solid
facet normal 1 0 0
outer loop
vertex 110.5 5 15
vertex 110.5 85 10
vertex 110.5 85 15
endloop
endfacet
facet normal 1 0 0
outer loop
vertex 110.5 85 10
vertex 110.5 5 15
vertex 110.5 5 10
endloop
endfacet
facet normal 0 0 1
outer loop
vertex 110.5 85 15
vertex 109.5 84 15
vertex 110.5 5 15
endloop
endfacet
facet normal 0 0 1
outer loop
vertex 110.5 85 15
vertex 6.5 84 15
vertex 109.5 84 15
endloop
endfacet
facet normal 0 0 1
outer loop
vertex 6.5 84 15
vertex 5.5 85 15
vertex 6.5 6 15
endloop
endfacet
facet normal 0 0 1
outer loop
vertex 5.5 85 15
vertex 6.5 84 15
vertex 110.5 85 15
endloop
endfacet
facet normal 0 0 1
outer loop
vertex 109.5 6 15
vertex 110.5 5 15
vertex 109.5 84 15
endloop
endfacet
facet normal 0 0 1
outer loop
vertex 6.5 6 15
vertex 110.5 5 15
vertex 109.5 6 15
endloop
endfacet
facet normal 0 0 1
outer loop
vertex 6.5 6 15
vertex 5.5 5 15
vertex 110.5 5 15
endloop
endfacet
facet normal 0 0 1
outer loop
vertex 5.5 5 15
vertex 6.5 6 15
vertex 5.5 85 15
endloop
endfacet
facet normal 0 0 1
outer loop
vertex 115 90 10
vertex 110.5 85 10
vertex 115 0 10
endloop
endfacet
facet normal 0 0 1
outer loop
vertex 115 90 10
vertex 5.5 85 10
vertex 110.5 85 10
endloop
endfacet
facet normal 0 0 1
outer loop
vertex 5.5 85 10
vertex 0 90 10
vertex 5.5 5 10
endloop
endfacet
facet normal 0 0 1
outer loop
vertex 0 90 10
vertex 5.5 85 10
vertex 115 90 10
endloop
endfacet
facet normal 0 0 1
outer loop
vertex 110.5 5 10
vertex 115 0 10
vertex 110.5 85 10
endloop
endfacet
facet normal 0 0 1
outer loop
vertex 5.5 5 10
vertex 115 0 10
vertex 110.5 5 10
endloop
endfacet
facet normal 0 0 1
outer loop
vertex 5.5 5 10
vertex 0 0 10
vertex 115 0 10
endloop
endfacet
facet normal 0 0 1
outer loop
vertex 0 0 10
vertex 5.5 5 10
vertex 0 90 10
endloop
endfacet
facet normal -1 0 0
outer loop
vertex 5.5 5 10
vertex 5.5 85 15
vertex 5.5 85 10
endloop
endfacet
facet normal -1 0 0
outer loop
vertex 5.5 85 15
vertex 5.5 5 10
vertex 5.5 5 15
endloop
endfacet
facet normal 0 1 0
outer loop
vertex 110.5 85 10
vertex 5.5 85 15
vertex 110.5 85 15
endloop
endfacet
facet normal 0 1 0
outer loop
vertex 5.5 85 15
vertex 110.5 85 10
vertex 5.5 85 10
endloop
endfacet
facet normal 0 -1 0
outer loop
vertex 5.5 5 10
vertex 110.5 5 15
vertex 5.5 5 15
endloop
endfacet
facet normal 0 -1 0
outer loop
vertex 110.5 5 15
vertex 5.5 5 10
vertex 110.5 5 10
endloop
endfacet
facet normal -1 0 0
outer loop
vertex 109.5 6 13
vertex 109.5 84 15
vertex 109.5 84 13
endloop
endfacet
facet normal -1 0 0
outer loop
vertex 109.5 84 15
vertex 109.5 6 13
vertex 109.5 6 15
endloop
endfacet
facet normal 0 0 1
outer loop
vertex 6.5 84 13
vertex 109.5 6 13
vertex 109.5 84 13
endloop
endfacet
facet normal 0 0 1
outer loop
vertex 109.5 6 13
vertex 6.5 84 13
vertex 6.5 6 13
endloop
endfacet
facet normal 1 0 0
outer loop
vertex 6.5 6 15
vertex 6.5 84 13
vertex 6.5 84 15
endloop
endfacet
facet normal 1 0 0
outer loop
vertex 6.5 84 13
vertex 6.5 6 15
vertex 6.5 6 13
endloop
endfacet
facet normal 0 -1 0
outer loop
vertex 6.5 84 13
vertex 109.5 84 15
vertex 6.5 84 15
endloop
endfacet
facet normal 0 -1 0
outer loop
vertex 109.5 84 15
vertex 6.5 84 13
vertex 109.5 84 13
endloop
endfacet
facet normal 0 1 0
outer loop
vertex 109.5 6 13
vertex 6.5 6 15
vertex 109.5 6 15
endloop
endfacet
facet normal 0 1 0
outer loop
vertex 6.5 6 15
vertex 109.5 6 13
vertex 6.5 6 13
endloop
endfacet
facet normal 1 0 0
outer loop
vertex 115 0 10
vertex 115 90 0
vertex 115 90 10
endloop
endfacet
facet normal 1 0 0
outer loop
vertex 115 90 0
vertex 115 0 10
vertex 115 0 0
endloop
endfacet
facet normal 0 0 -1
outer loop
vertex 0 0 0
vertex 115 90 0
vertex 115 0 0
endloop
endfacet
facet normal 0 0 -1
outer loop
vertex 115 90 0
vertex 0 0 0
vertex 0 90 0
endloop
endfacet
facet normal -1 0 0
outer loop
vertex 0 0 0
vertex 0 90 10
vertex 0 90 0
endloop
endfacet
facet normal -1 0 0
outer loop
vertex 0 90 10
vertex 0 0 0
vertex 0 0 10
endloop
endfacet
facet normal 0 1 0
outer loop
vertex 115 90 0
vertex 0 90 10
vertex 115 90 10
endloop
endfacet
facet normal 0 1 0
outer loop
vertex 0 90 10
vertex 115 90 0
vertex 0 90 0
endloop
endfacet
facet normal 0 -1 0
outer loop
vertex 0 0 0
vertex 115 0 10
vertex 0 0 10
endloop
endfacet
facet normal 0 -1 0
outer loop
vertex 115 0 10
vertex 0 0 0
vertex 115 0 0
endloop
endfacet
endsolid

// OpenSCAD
/*
 * Generic platform
 * Simply change the values for the base and the platform 
 * to mount the microcontroller should auto fit on top
*/

$fn=100;
base = [110 + 5, 85 + 5, 10]; // udoo
// base = [ 68.7 + 5, 53.3 + 5, 10 ]; // arduino uno
// base = [ 101.6 + 5, 53.3 + 5, 10 ]; // arduino mega/due

platform = [ base[0]-10, base[1]-10, base[2]-5];
platform_bed = [ platform[0]-2, platform[1]-2, platform[2]-3 ];
 
union() {
  cube(base);
  difference() {
    translate([5.5,5,base[2]]) cube(platform);
    translate([6.5,6,(platform[2]+base[2])-2]) cube(platform_bed);
  }
}
